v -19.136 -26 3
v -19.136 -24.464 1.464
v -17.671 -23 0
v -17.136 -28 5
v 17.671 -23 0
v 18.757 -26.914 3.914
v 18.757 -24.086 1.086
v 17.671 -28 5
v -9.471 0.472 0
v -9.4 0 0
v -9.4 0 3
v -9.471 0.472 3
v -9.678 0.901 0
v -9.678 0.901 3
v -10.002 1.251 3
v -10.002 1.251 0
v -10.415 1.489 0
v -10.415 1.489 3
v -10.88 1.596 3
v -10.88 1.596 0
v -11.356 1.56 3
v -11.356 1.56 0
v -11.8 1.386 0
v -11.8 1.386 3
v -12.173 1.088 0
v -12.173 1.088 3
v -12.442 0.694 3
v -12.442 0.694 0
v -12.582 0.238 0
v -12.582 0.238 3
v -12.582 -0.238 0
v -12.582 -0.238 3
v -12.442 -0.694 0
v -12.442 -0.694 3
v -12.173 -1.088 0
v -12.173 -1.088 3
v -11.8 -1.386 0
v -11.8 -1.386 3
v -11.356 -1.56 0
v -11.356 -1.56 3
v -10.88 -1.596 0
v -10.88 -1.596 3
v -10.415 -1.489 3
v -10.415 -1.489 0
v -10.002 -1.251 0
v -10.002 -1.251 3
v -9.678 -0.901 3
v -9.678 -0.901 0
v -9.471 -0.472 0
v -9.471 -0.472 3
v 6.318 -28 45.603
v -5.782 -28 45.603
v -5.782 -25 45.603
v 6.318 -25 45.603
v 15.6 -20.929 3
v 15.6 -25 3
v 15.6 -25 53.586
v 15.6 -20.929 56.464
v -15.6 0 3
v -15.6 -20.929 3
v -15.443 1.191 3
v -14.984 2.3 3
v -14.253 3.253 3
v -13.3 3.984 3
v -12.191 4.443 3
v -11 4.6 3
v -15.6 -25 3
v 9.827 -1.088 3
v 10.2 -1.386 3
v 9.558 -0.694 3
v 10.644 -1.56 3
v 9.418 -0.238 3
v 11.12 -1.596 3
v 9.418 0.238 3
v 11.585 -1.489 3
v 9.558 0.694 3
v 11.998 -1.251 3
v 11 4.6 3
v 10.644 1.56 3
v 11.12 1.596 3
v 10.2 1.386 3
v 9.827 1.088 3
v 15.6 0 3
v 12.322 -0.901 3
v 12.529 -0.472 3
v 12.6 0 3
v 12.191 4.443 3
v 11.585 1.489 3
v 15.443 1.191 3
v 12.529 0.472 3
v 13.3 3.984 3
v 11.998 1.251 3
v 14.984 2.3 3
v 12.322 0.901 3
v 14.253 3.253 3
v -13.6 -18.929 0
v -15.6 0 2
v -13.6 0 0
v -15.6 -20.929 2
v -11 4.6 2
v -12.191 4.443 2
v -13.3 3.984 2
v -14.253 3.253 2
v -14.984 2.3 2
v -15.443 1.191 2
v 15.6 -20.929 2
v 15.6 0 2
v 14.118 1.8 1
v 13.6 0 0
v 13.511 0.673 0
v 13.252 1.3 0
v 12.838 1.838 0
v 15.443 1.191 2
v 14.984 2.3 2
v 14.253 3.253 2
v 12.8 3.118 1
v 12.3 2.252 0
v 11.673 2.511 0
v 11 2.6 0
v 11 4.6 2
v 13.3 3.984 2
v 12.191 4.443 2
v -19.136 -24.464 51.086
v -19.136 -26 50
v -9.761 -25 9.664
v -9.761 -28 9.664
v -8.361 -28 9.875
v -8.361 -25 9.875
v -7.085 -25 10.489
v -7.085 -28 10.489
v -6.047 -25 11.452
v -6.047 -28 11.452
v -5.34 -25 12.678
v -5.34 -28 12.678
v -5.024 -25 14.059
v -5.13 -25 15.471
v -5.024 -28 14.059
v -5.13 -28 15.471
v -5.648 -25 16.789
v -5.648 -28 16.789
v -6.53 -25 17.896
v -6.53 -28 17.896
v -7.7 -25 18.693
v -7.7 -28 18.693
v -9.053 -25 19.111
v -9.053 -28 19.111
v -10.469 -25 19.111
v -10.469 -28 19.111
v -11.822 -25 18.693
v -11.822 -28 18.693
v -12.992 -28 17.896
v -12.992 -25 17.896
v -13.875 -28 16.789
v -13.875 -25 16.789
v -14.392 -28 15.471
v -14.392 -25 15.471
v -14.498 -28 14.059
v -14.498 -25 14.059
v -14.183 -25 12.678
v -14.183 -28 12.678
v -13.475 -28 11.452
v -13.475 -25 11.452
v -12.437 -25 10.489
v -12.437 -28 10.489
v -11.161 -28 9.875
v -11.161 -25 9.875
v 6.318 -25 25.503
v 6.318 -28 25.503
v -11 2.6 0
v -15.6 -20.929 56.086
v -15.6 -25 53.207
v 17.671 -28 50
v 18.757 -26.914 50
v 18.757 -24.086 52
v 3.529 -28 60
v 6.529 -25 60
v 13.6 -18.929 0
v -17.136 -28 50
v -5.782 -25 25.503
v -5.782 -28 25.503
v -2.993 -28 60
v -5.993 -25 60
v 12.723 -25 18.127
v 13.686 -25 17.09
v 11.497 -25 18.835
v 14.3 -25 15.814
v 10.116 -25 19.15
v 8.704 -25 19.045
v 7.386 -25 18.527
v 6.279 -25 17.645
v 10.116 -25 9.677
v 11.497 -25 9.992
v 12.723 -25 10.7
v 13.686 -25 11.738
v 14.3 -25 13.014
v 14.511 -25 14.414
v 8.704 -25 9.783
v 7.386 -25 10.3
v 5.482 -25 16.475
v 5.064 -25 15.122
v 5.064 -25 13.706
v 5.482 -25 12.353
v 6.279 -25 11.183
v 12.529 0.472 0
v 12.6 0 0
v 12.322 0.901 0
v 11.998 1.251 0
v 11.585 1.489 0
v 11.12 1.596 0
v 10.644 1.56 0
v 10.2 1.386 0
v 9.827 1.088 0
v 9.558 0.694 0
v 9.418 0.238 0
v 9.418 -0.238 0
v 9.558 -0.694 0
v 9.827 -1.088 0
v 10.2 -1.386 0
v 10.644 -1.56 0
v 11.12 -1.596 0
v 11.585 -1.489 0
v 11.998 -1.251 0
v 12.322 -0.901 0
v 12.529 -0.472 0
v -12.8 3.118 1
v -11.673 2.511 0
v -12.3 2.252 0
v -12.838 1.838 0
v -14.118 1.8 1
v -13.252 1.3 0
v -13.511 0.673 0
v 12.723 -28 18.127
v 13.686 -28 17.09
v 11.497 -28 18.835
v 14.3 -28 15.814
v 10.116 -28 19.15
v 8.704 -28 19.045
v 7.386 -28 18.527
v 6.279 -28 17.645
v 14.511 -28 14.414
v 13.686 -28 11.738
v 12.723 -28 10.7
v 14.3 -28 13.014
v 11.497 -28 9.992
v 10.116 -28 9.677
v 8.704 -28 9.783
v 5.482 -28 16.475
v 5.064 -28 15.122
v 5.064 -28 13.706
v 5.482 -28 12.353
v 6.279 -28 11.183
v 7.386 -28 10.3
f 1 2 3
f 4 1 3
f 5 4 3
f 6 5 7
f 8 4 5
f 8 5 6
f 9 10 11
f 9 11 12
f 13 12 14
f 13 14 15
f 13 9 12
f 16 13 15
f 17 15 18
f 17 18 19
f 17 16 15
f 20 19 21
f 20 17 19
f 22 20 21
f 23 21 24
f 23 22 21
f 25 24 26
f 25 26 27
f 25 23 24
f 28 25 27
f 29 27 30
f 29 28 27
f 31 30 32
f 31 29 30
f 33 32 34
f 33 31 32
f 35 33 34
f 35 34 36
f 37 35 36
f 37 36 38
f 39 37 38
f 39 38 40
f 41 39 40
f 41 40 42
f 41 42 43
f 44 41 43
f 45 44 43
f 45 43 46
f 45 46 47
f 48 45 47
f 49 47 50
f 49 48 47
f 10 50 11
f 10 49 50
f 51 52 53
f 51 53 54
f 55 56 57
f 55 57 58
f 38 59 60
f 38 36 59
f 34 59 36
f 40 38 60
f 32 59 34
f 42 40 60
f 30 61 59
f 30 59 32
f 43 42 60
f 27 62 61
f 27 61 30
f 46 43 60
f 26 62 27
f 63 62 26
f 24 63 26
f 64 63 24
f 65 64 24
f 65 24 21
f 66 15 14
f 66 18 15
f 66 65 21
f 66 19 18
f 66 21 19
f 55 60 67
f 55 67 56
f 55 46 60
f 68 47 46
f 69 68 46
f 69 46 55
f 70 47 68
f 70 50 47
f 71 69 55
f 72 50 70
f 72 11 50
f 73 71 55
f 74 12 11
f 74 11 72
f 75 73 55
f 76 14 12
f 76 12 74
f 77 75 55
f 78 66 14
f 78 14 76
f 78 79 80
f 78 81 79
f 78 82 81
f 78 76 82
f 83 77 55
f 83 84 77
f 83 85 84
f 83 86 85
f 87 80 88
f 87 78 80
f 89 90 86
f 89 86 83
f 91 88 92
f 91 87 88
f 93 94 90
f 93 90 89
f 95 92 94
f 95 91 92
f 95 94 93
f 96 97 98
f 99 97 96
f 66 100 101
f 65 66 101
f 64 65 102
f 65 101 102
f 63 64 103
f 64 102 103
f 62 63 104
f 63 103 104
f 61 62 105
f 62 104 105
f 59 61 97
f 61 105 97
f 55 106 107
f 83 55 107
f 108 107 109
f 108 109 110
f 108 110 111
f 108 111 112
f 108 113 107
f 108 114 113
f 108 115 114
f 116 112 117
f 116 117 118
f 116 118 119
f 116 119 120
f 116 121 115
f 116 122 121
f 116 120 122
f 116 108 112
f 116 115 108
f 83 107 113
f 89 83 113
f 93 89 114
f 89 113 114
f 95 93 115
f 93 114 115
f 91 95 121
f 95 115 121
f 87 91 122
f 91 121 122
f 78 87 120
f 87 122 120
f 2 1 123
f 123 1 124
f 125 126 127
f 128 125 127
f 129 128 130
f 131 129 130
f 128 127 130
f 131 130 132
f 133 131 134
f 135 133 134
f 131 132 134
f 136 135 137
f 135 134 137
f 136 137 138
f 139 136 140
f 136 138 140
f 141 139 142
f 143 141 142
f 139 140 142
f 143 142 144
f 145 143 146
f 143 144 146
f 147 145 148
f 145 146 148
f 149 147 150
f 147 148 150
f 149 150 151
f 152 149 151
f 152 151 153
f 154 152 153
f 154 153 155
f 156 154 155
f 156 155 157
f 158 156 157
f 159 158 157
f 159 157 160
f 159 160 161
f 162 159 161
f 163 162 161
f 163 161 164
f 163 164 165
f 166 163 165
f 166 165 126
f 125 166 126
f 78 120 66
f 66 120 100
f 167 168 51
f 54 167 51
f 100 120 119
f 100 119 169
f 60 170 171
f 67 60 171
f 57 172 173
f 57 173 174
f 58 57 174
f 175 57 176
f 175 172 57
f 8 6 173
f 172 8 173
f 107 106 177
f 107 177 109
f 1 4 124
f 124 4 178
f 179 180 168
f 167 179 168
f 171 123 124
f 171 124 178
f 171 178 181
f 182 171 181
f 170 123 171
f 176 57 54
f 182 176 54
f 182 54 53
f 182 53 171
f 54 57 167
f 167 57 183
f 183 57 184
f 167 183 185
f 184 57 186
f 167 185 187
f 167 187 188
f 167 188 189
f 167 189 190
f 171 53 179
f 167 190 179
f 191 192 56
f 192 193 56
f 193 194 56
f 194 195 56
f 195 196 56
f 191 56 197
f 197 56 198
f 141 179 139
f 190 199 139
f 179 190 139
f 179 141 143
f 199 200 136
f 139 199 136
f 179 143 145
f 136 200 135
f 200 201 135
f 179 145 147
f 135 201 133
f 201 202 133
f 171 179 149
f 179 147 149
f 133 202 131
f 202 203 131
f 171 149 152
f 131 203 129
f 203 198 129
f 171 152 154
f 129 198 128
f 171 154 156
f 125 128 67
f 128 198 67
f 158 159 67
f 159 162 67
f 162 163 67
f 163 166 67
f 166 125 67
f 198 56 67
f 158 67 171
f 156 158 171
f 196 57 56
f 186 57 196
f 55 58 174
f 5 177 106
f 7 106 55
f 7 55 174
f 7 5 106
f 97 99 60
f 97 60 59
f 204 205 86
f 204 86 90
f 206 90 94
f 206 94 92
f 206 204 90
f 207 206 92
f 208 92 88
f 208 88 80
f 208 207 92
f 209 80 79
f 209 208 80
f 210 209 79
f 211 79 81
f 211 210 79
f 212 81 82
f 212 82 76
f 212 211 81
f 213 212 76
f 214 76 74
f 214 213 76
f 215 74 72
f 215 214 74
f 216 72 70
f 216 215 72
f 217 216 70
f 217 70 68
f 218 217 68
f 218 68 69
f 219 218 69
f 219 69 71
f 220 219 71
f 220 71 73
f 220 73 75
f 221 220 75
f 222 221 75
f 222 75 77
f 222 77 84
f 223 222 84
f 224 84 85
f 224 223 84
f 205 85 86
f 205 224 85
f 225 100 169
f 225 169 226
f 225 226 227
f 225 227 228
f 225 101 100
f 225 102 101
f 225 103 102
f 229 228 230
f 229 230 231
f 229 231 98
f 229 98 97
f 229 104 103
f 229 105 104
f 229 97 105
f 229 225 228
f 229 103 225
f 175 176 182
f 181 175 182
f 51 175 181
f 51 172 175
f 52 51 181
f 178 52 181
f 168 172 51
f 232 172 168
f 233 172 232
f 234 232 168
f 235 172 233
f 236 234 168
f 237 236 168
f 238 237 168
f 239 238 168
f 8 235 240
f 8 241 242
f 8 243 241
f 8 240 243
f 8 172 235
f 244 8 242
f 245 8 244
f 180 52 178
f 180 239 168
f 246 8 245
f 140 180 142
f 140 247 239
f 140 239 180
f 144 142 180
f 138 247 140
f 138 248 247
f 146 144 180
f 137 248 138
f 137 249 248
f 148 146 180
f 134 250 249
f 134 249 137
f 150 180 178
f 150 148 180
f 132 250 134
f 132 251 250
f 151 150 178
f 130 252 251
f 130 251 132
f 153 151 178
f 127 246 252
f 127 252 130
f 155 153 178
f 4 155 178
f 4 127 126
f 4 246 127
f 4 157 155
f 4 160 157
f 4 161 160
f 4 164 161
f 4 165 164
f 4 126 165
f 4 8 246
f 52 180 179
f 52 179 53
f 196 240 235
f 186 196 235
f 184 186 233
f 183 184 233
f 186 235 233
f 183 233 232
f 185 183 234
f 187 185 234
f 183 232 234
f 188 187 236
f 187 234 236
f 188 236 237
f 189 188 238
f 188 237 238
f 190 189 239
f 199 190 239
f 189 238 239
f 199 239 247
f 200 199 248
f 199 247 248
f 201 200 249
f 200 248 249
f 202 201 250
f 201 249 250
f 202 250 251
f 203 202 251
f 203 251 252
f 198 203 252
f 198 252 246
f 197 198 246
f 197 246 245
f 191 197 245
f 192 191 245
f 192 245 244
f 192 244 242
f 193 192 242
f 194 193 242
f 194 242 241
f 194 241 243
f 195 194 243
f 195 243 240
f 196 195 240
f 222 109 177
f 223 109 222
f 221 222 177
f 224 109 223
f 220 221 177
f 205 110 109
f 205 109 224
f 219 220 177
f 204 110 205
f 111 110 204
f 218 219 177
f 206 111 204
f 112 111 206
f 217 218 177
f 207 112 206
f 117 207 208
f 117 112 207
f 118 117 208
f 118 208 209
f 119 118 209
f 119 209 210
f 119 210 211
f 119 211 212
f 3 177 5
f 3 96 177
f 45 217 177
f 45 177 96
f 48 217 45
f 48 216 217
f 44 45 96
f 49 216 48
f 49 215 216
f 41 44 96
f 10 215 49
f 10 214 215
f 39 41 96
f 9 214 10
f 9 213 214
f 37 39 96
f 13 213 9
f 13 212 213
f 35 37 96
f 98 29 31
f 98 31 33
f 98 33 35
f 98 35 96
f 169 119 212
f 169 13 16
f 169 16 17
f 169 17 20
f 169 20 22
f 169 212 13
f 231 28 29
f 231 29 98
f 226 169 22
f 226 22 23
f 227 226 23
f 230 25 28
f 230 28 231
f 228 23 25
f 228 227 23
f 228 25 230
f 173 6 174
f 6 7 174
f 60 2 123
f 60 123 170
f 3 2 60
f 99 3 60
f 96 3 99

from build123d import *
from OCP.BRepFilletAPI import BRepFilletAPI_MakeChamfer

# Parameters (mm, degrees)
SKETCH1_R           = 1.6
BOSS_EXTRUDE1_DEPTH = 3
SKETCH3_W           = 31.2
SKETCH3_H           = 3
BOSS_EXTRUDE2_DEPTH = 60
BOSS_EXTRUDE3_DEPTH = 60
CHAMFER1_SIZE       = 5
CHAMFER1_SIZE2      = 3.535533906
CHAMFER2_SIZE       = 2
CHAMFER3_SIZE       = 2
CHAMFER4_SIZE       = 2
SKETCH5_W           = 12.1
SKETCH5_H           = 20.1
CUT_EXTRUDE1_DEPTH  = 30
SKETCH6_R           = 4.75
CUT_EXTRUDE2_DEPTH  = 30
CHAMFER5_SIZE       = 10


with BuildPart() as part:
    # Sketch1 → Boss-Extrude1 (new body)
    with BuildSketch(Plane.XY):
        with BuildLine():
            ThreePointArc((-11, 4.6), (-14.252691193, 3.252691193), (-15.6, 0))
            Line((-15.6, 0), (-15.6, -25))
            Line((-15.6, -25), (15.6, -25))
            Line((15.6, -25), (15.6, 0))
            ThreePointArc((15.6, 0), (14.252691193, 3.252691193), (11, 4.6))
            Line((11, 4.6), (-11, 4.6))
        make_face()
        with Locations((-11, 0)):
            Circle(SKETCH1_R, mode=Mode.SUBTRACT)
        with Locations((11, 0)):
            Circle(SKETCH1_R, mode=Mode.SUBTRACT)
    extrude(amount=BOSS_EXTRUDE1_DEPTH)

    # Sketch3 → Boss-Extrude2 (add)
    with BuildSketch(Plane(origin=(0, 0, 0), x_dir=(-1, 0, 0), z_dir=(0, 0, -1))):
        with Locations((0, -26.5)):
            Rectangle(SKETCH3_W, SKETCH3_H)
    extrude(amount=-BOSS_EXTRUDE2_DEPTH)

    # Sketch4 → Boss-Extrude3 (add)
    with BuildSketch(Plane(origin=(0, 0, 0), x_dir=(-1, 0, 0), z_dir=(0, 0, -1))):
        Polygon((-15.6, -28), (-15.6, -20.928932188), (-22.671067812, -28), align=None)
        Polygon((15.6, -20.928932188), (15.6, -28), (22.671067812, -28), align=None)
    extrude(amount=-BOSS_EXTRUDE3_DEPTH)

    # Chamfer1: one chamfer whose edges measure the first distance from different faces: ONE call of the kernel's chamfer builder (chamfer() names one face for all edges)
    chamfer1_edges_1 = [part.edges().sort_by_distance(p)[0] for p in [
        (0, -28, 0),
    ]]
    chamfer1_edges_2 = [part.edges().sort_by_distance(p)[0] for p in [
        (22.671067812, -28, 30),
    ]]
    chamfer1_side_2 = [part.faces().sort_by_distance(p)[0] for p in [
        (0, -28, 30),
    ]]
    chamfer1_edges_3 = [part.edges().sort_by_distance(p)[0] for p in [
        (-22.671067812, -28, 30),
    ]]
    chamfer1_side_3 = [part.faces().sort_by_distance(p)[0] for p in [
        (-19.135533906, -24.464466094, 30),
    ]]
    chamfer1 = BRepFilletAPI_MakeChamfer(part.part.solid().wrapped)
    for e in chamfer1_edges_1:
        chamfer1.Add(CHAMFER1_SIZE, e.wrapped)
    for e in chamfer1_edges_2:
        chamfer1.Add(CHAMFER1_SIZE, CHAMFER1_SIZE2, e.wrapped, chamfer1_side_2[0].wrapped)  # the first distance lies on this face
    for e in chamfer1_edges_3:
        chamfer1.Add(CHAMFER1_SIZE, CHAMFER1_SIZE2, e.wrapped, chamfer1_side_3[0].wrapped)  # the first distance lies on this face
    add(Compound.cast(chamfer1.Shape()), mode=Mode.REPLACE)

    # Chamfer2
    chamfer2_edges = [part.edges().sort_by_distance(p)[0] for p in [
        (14.252691193, 3.252691193, 0),
        (15.6, -10.464466094, 0),
        (-15.6, -10.464466094, 0),
        (-14.252691193, 3.252691193, 0),
        (0, 4.6, 0),
    ]]
    chamfer(chamfer2_edges, length=CHAMFER2_SIZE)

    # Chamfer3
    chamfer3_edges = [part.edges().sort_by_distance(p)[0] for p in [
        (-19.135533906, -28, 32.5),
    ]]
    chamfer(chamfer3_edges, length=CHAMFER3_SIZE)

    # Chamfer4
    chamfer4_edges = [part.edges().sort_by_distance(p)[0] for p in [
        (20.171067812, -25.5, 31.25),
    ]]
    chamfer(chamfer4_edges, length=CHAMFER4_SIZE)

    # Sketch5 → Cut-Extrude1 (cut)
    with BuildSketch(Plane.XZ.offset(28)):
        with Locations((0.267766953, 35.55312029)):
            Rectangle(SKETCH5_W, SKETCH5_H)
    extrude(amount=-CUT_EXTRUDE1_DEPTH, mode=Mode.SUBTRACT)

    # Sketch6 → Cut-Extrude2 (cut)
    with BuildSketch(Plane.XZ.offset(28)):
        with Locations((9.761183066, 14.413738274)):
            Circle(SKETCH6_R)
        with Locations(Location((-9.761183066, 14.413738274, 0), (0, 0, 270))):
            Circle(SKETCH6_R)
    extrude(amount=-CUT_EXTRUDE2_DEPTH, mode=Mode.SUBTRACT)

    # Chamfer5
    # the kernel refuses this chamfer: 10 mm, written as the material it takes off along each edge
    with BuildSketch(Plane(origin=(-37.320078704, -7.815455201, 60), x_dir=(-0.019442520806014, -0.01944252080601393, -0.9996219169112968), z_dir=(0.7071067811865462, -0.7071067811865488, 0))) as chamfer5_piece_1:
        Polygon((CHAMFER5_SIZE * 0.999621916911, CHAMFER5_SIZE * 0.0274958766106), (-CHAMFER5_SIZE * 0.0274958766106, CHAMFER5_SIZE * 0.999621916911), (0, 0), align=None)
    extrude(amount=54.262086884, mode=Mode.SUBTRACT)
    with BuildSketch(Plane(origin=(-0.513476987, -46.184544799, 60), x_dir=(0.019442520806014572, -0.019442520806014493, -0.9996219169112968), z_dir=(0.7071067811865461, 0.707106781186549, 0))) as chamfer5_piece_2:
        Polygon((CHAMFER5_SIZE * 0.999621916911, CHAMFER5_SIZE * 0.0274958766106), (-CHAMFER5_SIZE * 0.0274958766106, CHAMFER5_SIZE * 0.999621916911), (0, 0), align=None)
    extrude(amount=52.969193665, mode=Mode.SUBTRACT)


solid = part.part
